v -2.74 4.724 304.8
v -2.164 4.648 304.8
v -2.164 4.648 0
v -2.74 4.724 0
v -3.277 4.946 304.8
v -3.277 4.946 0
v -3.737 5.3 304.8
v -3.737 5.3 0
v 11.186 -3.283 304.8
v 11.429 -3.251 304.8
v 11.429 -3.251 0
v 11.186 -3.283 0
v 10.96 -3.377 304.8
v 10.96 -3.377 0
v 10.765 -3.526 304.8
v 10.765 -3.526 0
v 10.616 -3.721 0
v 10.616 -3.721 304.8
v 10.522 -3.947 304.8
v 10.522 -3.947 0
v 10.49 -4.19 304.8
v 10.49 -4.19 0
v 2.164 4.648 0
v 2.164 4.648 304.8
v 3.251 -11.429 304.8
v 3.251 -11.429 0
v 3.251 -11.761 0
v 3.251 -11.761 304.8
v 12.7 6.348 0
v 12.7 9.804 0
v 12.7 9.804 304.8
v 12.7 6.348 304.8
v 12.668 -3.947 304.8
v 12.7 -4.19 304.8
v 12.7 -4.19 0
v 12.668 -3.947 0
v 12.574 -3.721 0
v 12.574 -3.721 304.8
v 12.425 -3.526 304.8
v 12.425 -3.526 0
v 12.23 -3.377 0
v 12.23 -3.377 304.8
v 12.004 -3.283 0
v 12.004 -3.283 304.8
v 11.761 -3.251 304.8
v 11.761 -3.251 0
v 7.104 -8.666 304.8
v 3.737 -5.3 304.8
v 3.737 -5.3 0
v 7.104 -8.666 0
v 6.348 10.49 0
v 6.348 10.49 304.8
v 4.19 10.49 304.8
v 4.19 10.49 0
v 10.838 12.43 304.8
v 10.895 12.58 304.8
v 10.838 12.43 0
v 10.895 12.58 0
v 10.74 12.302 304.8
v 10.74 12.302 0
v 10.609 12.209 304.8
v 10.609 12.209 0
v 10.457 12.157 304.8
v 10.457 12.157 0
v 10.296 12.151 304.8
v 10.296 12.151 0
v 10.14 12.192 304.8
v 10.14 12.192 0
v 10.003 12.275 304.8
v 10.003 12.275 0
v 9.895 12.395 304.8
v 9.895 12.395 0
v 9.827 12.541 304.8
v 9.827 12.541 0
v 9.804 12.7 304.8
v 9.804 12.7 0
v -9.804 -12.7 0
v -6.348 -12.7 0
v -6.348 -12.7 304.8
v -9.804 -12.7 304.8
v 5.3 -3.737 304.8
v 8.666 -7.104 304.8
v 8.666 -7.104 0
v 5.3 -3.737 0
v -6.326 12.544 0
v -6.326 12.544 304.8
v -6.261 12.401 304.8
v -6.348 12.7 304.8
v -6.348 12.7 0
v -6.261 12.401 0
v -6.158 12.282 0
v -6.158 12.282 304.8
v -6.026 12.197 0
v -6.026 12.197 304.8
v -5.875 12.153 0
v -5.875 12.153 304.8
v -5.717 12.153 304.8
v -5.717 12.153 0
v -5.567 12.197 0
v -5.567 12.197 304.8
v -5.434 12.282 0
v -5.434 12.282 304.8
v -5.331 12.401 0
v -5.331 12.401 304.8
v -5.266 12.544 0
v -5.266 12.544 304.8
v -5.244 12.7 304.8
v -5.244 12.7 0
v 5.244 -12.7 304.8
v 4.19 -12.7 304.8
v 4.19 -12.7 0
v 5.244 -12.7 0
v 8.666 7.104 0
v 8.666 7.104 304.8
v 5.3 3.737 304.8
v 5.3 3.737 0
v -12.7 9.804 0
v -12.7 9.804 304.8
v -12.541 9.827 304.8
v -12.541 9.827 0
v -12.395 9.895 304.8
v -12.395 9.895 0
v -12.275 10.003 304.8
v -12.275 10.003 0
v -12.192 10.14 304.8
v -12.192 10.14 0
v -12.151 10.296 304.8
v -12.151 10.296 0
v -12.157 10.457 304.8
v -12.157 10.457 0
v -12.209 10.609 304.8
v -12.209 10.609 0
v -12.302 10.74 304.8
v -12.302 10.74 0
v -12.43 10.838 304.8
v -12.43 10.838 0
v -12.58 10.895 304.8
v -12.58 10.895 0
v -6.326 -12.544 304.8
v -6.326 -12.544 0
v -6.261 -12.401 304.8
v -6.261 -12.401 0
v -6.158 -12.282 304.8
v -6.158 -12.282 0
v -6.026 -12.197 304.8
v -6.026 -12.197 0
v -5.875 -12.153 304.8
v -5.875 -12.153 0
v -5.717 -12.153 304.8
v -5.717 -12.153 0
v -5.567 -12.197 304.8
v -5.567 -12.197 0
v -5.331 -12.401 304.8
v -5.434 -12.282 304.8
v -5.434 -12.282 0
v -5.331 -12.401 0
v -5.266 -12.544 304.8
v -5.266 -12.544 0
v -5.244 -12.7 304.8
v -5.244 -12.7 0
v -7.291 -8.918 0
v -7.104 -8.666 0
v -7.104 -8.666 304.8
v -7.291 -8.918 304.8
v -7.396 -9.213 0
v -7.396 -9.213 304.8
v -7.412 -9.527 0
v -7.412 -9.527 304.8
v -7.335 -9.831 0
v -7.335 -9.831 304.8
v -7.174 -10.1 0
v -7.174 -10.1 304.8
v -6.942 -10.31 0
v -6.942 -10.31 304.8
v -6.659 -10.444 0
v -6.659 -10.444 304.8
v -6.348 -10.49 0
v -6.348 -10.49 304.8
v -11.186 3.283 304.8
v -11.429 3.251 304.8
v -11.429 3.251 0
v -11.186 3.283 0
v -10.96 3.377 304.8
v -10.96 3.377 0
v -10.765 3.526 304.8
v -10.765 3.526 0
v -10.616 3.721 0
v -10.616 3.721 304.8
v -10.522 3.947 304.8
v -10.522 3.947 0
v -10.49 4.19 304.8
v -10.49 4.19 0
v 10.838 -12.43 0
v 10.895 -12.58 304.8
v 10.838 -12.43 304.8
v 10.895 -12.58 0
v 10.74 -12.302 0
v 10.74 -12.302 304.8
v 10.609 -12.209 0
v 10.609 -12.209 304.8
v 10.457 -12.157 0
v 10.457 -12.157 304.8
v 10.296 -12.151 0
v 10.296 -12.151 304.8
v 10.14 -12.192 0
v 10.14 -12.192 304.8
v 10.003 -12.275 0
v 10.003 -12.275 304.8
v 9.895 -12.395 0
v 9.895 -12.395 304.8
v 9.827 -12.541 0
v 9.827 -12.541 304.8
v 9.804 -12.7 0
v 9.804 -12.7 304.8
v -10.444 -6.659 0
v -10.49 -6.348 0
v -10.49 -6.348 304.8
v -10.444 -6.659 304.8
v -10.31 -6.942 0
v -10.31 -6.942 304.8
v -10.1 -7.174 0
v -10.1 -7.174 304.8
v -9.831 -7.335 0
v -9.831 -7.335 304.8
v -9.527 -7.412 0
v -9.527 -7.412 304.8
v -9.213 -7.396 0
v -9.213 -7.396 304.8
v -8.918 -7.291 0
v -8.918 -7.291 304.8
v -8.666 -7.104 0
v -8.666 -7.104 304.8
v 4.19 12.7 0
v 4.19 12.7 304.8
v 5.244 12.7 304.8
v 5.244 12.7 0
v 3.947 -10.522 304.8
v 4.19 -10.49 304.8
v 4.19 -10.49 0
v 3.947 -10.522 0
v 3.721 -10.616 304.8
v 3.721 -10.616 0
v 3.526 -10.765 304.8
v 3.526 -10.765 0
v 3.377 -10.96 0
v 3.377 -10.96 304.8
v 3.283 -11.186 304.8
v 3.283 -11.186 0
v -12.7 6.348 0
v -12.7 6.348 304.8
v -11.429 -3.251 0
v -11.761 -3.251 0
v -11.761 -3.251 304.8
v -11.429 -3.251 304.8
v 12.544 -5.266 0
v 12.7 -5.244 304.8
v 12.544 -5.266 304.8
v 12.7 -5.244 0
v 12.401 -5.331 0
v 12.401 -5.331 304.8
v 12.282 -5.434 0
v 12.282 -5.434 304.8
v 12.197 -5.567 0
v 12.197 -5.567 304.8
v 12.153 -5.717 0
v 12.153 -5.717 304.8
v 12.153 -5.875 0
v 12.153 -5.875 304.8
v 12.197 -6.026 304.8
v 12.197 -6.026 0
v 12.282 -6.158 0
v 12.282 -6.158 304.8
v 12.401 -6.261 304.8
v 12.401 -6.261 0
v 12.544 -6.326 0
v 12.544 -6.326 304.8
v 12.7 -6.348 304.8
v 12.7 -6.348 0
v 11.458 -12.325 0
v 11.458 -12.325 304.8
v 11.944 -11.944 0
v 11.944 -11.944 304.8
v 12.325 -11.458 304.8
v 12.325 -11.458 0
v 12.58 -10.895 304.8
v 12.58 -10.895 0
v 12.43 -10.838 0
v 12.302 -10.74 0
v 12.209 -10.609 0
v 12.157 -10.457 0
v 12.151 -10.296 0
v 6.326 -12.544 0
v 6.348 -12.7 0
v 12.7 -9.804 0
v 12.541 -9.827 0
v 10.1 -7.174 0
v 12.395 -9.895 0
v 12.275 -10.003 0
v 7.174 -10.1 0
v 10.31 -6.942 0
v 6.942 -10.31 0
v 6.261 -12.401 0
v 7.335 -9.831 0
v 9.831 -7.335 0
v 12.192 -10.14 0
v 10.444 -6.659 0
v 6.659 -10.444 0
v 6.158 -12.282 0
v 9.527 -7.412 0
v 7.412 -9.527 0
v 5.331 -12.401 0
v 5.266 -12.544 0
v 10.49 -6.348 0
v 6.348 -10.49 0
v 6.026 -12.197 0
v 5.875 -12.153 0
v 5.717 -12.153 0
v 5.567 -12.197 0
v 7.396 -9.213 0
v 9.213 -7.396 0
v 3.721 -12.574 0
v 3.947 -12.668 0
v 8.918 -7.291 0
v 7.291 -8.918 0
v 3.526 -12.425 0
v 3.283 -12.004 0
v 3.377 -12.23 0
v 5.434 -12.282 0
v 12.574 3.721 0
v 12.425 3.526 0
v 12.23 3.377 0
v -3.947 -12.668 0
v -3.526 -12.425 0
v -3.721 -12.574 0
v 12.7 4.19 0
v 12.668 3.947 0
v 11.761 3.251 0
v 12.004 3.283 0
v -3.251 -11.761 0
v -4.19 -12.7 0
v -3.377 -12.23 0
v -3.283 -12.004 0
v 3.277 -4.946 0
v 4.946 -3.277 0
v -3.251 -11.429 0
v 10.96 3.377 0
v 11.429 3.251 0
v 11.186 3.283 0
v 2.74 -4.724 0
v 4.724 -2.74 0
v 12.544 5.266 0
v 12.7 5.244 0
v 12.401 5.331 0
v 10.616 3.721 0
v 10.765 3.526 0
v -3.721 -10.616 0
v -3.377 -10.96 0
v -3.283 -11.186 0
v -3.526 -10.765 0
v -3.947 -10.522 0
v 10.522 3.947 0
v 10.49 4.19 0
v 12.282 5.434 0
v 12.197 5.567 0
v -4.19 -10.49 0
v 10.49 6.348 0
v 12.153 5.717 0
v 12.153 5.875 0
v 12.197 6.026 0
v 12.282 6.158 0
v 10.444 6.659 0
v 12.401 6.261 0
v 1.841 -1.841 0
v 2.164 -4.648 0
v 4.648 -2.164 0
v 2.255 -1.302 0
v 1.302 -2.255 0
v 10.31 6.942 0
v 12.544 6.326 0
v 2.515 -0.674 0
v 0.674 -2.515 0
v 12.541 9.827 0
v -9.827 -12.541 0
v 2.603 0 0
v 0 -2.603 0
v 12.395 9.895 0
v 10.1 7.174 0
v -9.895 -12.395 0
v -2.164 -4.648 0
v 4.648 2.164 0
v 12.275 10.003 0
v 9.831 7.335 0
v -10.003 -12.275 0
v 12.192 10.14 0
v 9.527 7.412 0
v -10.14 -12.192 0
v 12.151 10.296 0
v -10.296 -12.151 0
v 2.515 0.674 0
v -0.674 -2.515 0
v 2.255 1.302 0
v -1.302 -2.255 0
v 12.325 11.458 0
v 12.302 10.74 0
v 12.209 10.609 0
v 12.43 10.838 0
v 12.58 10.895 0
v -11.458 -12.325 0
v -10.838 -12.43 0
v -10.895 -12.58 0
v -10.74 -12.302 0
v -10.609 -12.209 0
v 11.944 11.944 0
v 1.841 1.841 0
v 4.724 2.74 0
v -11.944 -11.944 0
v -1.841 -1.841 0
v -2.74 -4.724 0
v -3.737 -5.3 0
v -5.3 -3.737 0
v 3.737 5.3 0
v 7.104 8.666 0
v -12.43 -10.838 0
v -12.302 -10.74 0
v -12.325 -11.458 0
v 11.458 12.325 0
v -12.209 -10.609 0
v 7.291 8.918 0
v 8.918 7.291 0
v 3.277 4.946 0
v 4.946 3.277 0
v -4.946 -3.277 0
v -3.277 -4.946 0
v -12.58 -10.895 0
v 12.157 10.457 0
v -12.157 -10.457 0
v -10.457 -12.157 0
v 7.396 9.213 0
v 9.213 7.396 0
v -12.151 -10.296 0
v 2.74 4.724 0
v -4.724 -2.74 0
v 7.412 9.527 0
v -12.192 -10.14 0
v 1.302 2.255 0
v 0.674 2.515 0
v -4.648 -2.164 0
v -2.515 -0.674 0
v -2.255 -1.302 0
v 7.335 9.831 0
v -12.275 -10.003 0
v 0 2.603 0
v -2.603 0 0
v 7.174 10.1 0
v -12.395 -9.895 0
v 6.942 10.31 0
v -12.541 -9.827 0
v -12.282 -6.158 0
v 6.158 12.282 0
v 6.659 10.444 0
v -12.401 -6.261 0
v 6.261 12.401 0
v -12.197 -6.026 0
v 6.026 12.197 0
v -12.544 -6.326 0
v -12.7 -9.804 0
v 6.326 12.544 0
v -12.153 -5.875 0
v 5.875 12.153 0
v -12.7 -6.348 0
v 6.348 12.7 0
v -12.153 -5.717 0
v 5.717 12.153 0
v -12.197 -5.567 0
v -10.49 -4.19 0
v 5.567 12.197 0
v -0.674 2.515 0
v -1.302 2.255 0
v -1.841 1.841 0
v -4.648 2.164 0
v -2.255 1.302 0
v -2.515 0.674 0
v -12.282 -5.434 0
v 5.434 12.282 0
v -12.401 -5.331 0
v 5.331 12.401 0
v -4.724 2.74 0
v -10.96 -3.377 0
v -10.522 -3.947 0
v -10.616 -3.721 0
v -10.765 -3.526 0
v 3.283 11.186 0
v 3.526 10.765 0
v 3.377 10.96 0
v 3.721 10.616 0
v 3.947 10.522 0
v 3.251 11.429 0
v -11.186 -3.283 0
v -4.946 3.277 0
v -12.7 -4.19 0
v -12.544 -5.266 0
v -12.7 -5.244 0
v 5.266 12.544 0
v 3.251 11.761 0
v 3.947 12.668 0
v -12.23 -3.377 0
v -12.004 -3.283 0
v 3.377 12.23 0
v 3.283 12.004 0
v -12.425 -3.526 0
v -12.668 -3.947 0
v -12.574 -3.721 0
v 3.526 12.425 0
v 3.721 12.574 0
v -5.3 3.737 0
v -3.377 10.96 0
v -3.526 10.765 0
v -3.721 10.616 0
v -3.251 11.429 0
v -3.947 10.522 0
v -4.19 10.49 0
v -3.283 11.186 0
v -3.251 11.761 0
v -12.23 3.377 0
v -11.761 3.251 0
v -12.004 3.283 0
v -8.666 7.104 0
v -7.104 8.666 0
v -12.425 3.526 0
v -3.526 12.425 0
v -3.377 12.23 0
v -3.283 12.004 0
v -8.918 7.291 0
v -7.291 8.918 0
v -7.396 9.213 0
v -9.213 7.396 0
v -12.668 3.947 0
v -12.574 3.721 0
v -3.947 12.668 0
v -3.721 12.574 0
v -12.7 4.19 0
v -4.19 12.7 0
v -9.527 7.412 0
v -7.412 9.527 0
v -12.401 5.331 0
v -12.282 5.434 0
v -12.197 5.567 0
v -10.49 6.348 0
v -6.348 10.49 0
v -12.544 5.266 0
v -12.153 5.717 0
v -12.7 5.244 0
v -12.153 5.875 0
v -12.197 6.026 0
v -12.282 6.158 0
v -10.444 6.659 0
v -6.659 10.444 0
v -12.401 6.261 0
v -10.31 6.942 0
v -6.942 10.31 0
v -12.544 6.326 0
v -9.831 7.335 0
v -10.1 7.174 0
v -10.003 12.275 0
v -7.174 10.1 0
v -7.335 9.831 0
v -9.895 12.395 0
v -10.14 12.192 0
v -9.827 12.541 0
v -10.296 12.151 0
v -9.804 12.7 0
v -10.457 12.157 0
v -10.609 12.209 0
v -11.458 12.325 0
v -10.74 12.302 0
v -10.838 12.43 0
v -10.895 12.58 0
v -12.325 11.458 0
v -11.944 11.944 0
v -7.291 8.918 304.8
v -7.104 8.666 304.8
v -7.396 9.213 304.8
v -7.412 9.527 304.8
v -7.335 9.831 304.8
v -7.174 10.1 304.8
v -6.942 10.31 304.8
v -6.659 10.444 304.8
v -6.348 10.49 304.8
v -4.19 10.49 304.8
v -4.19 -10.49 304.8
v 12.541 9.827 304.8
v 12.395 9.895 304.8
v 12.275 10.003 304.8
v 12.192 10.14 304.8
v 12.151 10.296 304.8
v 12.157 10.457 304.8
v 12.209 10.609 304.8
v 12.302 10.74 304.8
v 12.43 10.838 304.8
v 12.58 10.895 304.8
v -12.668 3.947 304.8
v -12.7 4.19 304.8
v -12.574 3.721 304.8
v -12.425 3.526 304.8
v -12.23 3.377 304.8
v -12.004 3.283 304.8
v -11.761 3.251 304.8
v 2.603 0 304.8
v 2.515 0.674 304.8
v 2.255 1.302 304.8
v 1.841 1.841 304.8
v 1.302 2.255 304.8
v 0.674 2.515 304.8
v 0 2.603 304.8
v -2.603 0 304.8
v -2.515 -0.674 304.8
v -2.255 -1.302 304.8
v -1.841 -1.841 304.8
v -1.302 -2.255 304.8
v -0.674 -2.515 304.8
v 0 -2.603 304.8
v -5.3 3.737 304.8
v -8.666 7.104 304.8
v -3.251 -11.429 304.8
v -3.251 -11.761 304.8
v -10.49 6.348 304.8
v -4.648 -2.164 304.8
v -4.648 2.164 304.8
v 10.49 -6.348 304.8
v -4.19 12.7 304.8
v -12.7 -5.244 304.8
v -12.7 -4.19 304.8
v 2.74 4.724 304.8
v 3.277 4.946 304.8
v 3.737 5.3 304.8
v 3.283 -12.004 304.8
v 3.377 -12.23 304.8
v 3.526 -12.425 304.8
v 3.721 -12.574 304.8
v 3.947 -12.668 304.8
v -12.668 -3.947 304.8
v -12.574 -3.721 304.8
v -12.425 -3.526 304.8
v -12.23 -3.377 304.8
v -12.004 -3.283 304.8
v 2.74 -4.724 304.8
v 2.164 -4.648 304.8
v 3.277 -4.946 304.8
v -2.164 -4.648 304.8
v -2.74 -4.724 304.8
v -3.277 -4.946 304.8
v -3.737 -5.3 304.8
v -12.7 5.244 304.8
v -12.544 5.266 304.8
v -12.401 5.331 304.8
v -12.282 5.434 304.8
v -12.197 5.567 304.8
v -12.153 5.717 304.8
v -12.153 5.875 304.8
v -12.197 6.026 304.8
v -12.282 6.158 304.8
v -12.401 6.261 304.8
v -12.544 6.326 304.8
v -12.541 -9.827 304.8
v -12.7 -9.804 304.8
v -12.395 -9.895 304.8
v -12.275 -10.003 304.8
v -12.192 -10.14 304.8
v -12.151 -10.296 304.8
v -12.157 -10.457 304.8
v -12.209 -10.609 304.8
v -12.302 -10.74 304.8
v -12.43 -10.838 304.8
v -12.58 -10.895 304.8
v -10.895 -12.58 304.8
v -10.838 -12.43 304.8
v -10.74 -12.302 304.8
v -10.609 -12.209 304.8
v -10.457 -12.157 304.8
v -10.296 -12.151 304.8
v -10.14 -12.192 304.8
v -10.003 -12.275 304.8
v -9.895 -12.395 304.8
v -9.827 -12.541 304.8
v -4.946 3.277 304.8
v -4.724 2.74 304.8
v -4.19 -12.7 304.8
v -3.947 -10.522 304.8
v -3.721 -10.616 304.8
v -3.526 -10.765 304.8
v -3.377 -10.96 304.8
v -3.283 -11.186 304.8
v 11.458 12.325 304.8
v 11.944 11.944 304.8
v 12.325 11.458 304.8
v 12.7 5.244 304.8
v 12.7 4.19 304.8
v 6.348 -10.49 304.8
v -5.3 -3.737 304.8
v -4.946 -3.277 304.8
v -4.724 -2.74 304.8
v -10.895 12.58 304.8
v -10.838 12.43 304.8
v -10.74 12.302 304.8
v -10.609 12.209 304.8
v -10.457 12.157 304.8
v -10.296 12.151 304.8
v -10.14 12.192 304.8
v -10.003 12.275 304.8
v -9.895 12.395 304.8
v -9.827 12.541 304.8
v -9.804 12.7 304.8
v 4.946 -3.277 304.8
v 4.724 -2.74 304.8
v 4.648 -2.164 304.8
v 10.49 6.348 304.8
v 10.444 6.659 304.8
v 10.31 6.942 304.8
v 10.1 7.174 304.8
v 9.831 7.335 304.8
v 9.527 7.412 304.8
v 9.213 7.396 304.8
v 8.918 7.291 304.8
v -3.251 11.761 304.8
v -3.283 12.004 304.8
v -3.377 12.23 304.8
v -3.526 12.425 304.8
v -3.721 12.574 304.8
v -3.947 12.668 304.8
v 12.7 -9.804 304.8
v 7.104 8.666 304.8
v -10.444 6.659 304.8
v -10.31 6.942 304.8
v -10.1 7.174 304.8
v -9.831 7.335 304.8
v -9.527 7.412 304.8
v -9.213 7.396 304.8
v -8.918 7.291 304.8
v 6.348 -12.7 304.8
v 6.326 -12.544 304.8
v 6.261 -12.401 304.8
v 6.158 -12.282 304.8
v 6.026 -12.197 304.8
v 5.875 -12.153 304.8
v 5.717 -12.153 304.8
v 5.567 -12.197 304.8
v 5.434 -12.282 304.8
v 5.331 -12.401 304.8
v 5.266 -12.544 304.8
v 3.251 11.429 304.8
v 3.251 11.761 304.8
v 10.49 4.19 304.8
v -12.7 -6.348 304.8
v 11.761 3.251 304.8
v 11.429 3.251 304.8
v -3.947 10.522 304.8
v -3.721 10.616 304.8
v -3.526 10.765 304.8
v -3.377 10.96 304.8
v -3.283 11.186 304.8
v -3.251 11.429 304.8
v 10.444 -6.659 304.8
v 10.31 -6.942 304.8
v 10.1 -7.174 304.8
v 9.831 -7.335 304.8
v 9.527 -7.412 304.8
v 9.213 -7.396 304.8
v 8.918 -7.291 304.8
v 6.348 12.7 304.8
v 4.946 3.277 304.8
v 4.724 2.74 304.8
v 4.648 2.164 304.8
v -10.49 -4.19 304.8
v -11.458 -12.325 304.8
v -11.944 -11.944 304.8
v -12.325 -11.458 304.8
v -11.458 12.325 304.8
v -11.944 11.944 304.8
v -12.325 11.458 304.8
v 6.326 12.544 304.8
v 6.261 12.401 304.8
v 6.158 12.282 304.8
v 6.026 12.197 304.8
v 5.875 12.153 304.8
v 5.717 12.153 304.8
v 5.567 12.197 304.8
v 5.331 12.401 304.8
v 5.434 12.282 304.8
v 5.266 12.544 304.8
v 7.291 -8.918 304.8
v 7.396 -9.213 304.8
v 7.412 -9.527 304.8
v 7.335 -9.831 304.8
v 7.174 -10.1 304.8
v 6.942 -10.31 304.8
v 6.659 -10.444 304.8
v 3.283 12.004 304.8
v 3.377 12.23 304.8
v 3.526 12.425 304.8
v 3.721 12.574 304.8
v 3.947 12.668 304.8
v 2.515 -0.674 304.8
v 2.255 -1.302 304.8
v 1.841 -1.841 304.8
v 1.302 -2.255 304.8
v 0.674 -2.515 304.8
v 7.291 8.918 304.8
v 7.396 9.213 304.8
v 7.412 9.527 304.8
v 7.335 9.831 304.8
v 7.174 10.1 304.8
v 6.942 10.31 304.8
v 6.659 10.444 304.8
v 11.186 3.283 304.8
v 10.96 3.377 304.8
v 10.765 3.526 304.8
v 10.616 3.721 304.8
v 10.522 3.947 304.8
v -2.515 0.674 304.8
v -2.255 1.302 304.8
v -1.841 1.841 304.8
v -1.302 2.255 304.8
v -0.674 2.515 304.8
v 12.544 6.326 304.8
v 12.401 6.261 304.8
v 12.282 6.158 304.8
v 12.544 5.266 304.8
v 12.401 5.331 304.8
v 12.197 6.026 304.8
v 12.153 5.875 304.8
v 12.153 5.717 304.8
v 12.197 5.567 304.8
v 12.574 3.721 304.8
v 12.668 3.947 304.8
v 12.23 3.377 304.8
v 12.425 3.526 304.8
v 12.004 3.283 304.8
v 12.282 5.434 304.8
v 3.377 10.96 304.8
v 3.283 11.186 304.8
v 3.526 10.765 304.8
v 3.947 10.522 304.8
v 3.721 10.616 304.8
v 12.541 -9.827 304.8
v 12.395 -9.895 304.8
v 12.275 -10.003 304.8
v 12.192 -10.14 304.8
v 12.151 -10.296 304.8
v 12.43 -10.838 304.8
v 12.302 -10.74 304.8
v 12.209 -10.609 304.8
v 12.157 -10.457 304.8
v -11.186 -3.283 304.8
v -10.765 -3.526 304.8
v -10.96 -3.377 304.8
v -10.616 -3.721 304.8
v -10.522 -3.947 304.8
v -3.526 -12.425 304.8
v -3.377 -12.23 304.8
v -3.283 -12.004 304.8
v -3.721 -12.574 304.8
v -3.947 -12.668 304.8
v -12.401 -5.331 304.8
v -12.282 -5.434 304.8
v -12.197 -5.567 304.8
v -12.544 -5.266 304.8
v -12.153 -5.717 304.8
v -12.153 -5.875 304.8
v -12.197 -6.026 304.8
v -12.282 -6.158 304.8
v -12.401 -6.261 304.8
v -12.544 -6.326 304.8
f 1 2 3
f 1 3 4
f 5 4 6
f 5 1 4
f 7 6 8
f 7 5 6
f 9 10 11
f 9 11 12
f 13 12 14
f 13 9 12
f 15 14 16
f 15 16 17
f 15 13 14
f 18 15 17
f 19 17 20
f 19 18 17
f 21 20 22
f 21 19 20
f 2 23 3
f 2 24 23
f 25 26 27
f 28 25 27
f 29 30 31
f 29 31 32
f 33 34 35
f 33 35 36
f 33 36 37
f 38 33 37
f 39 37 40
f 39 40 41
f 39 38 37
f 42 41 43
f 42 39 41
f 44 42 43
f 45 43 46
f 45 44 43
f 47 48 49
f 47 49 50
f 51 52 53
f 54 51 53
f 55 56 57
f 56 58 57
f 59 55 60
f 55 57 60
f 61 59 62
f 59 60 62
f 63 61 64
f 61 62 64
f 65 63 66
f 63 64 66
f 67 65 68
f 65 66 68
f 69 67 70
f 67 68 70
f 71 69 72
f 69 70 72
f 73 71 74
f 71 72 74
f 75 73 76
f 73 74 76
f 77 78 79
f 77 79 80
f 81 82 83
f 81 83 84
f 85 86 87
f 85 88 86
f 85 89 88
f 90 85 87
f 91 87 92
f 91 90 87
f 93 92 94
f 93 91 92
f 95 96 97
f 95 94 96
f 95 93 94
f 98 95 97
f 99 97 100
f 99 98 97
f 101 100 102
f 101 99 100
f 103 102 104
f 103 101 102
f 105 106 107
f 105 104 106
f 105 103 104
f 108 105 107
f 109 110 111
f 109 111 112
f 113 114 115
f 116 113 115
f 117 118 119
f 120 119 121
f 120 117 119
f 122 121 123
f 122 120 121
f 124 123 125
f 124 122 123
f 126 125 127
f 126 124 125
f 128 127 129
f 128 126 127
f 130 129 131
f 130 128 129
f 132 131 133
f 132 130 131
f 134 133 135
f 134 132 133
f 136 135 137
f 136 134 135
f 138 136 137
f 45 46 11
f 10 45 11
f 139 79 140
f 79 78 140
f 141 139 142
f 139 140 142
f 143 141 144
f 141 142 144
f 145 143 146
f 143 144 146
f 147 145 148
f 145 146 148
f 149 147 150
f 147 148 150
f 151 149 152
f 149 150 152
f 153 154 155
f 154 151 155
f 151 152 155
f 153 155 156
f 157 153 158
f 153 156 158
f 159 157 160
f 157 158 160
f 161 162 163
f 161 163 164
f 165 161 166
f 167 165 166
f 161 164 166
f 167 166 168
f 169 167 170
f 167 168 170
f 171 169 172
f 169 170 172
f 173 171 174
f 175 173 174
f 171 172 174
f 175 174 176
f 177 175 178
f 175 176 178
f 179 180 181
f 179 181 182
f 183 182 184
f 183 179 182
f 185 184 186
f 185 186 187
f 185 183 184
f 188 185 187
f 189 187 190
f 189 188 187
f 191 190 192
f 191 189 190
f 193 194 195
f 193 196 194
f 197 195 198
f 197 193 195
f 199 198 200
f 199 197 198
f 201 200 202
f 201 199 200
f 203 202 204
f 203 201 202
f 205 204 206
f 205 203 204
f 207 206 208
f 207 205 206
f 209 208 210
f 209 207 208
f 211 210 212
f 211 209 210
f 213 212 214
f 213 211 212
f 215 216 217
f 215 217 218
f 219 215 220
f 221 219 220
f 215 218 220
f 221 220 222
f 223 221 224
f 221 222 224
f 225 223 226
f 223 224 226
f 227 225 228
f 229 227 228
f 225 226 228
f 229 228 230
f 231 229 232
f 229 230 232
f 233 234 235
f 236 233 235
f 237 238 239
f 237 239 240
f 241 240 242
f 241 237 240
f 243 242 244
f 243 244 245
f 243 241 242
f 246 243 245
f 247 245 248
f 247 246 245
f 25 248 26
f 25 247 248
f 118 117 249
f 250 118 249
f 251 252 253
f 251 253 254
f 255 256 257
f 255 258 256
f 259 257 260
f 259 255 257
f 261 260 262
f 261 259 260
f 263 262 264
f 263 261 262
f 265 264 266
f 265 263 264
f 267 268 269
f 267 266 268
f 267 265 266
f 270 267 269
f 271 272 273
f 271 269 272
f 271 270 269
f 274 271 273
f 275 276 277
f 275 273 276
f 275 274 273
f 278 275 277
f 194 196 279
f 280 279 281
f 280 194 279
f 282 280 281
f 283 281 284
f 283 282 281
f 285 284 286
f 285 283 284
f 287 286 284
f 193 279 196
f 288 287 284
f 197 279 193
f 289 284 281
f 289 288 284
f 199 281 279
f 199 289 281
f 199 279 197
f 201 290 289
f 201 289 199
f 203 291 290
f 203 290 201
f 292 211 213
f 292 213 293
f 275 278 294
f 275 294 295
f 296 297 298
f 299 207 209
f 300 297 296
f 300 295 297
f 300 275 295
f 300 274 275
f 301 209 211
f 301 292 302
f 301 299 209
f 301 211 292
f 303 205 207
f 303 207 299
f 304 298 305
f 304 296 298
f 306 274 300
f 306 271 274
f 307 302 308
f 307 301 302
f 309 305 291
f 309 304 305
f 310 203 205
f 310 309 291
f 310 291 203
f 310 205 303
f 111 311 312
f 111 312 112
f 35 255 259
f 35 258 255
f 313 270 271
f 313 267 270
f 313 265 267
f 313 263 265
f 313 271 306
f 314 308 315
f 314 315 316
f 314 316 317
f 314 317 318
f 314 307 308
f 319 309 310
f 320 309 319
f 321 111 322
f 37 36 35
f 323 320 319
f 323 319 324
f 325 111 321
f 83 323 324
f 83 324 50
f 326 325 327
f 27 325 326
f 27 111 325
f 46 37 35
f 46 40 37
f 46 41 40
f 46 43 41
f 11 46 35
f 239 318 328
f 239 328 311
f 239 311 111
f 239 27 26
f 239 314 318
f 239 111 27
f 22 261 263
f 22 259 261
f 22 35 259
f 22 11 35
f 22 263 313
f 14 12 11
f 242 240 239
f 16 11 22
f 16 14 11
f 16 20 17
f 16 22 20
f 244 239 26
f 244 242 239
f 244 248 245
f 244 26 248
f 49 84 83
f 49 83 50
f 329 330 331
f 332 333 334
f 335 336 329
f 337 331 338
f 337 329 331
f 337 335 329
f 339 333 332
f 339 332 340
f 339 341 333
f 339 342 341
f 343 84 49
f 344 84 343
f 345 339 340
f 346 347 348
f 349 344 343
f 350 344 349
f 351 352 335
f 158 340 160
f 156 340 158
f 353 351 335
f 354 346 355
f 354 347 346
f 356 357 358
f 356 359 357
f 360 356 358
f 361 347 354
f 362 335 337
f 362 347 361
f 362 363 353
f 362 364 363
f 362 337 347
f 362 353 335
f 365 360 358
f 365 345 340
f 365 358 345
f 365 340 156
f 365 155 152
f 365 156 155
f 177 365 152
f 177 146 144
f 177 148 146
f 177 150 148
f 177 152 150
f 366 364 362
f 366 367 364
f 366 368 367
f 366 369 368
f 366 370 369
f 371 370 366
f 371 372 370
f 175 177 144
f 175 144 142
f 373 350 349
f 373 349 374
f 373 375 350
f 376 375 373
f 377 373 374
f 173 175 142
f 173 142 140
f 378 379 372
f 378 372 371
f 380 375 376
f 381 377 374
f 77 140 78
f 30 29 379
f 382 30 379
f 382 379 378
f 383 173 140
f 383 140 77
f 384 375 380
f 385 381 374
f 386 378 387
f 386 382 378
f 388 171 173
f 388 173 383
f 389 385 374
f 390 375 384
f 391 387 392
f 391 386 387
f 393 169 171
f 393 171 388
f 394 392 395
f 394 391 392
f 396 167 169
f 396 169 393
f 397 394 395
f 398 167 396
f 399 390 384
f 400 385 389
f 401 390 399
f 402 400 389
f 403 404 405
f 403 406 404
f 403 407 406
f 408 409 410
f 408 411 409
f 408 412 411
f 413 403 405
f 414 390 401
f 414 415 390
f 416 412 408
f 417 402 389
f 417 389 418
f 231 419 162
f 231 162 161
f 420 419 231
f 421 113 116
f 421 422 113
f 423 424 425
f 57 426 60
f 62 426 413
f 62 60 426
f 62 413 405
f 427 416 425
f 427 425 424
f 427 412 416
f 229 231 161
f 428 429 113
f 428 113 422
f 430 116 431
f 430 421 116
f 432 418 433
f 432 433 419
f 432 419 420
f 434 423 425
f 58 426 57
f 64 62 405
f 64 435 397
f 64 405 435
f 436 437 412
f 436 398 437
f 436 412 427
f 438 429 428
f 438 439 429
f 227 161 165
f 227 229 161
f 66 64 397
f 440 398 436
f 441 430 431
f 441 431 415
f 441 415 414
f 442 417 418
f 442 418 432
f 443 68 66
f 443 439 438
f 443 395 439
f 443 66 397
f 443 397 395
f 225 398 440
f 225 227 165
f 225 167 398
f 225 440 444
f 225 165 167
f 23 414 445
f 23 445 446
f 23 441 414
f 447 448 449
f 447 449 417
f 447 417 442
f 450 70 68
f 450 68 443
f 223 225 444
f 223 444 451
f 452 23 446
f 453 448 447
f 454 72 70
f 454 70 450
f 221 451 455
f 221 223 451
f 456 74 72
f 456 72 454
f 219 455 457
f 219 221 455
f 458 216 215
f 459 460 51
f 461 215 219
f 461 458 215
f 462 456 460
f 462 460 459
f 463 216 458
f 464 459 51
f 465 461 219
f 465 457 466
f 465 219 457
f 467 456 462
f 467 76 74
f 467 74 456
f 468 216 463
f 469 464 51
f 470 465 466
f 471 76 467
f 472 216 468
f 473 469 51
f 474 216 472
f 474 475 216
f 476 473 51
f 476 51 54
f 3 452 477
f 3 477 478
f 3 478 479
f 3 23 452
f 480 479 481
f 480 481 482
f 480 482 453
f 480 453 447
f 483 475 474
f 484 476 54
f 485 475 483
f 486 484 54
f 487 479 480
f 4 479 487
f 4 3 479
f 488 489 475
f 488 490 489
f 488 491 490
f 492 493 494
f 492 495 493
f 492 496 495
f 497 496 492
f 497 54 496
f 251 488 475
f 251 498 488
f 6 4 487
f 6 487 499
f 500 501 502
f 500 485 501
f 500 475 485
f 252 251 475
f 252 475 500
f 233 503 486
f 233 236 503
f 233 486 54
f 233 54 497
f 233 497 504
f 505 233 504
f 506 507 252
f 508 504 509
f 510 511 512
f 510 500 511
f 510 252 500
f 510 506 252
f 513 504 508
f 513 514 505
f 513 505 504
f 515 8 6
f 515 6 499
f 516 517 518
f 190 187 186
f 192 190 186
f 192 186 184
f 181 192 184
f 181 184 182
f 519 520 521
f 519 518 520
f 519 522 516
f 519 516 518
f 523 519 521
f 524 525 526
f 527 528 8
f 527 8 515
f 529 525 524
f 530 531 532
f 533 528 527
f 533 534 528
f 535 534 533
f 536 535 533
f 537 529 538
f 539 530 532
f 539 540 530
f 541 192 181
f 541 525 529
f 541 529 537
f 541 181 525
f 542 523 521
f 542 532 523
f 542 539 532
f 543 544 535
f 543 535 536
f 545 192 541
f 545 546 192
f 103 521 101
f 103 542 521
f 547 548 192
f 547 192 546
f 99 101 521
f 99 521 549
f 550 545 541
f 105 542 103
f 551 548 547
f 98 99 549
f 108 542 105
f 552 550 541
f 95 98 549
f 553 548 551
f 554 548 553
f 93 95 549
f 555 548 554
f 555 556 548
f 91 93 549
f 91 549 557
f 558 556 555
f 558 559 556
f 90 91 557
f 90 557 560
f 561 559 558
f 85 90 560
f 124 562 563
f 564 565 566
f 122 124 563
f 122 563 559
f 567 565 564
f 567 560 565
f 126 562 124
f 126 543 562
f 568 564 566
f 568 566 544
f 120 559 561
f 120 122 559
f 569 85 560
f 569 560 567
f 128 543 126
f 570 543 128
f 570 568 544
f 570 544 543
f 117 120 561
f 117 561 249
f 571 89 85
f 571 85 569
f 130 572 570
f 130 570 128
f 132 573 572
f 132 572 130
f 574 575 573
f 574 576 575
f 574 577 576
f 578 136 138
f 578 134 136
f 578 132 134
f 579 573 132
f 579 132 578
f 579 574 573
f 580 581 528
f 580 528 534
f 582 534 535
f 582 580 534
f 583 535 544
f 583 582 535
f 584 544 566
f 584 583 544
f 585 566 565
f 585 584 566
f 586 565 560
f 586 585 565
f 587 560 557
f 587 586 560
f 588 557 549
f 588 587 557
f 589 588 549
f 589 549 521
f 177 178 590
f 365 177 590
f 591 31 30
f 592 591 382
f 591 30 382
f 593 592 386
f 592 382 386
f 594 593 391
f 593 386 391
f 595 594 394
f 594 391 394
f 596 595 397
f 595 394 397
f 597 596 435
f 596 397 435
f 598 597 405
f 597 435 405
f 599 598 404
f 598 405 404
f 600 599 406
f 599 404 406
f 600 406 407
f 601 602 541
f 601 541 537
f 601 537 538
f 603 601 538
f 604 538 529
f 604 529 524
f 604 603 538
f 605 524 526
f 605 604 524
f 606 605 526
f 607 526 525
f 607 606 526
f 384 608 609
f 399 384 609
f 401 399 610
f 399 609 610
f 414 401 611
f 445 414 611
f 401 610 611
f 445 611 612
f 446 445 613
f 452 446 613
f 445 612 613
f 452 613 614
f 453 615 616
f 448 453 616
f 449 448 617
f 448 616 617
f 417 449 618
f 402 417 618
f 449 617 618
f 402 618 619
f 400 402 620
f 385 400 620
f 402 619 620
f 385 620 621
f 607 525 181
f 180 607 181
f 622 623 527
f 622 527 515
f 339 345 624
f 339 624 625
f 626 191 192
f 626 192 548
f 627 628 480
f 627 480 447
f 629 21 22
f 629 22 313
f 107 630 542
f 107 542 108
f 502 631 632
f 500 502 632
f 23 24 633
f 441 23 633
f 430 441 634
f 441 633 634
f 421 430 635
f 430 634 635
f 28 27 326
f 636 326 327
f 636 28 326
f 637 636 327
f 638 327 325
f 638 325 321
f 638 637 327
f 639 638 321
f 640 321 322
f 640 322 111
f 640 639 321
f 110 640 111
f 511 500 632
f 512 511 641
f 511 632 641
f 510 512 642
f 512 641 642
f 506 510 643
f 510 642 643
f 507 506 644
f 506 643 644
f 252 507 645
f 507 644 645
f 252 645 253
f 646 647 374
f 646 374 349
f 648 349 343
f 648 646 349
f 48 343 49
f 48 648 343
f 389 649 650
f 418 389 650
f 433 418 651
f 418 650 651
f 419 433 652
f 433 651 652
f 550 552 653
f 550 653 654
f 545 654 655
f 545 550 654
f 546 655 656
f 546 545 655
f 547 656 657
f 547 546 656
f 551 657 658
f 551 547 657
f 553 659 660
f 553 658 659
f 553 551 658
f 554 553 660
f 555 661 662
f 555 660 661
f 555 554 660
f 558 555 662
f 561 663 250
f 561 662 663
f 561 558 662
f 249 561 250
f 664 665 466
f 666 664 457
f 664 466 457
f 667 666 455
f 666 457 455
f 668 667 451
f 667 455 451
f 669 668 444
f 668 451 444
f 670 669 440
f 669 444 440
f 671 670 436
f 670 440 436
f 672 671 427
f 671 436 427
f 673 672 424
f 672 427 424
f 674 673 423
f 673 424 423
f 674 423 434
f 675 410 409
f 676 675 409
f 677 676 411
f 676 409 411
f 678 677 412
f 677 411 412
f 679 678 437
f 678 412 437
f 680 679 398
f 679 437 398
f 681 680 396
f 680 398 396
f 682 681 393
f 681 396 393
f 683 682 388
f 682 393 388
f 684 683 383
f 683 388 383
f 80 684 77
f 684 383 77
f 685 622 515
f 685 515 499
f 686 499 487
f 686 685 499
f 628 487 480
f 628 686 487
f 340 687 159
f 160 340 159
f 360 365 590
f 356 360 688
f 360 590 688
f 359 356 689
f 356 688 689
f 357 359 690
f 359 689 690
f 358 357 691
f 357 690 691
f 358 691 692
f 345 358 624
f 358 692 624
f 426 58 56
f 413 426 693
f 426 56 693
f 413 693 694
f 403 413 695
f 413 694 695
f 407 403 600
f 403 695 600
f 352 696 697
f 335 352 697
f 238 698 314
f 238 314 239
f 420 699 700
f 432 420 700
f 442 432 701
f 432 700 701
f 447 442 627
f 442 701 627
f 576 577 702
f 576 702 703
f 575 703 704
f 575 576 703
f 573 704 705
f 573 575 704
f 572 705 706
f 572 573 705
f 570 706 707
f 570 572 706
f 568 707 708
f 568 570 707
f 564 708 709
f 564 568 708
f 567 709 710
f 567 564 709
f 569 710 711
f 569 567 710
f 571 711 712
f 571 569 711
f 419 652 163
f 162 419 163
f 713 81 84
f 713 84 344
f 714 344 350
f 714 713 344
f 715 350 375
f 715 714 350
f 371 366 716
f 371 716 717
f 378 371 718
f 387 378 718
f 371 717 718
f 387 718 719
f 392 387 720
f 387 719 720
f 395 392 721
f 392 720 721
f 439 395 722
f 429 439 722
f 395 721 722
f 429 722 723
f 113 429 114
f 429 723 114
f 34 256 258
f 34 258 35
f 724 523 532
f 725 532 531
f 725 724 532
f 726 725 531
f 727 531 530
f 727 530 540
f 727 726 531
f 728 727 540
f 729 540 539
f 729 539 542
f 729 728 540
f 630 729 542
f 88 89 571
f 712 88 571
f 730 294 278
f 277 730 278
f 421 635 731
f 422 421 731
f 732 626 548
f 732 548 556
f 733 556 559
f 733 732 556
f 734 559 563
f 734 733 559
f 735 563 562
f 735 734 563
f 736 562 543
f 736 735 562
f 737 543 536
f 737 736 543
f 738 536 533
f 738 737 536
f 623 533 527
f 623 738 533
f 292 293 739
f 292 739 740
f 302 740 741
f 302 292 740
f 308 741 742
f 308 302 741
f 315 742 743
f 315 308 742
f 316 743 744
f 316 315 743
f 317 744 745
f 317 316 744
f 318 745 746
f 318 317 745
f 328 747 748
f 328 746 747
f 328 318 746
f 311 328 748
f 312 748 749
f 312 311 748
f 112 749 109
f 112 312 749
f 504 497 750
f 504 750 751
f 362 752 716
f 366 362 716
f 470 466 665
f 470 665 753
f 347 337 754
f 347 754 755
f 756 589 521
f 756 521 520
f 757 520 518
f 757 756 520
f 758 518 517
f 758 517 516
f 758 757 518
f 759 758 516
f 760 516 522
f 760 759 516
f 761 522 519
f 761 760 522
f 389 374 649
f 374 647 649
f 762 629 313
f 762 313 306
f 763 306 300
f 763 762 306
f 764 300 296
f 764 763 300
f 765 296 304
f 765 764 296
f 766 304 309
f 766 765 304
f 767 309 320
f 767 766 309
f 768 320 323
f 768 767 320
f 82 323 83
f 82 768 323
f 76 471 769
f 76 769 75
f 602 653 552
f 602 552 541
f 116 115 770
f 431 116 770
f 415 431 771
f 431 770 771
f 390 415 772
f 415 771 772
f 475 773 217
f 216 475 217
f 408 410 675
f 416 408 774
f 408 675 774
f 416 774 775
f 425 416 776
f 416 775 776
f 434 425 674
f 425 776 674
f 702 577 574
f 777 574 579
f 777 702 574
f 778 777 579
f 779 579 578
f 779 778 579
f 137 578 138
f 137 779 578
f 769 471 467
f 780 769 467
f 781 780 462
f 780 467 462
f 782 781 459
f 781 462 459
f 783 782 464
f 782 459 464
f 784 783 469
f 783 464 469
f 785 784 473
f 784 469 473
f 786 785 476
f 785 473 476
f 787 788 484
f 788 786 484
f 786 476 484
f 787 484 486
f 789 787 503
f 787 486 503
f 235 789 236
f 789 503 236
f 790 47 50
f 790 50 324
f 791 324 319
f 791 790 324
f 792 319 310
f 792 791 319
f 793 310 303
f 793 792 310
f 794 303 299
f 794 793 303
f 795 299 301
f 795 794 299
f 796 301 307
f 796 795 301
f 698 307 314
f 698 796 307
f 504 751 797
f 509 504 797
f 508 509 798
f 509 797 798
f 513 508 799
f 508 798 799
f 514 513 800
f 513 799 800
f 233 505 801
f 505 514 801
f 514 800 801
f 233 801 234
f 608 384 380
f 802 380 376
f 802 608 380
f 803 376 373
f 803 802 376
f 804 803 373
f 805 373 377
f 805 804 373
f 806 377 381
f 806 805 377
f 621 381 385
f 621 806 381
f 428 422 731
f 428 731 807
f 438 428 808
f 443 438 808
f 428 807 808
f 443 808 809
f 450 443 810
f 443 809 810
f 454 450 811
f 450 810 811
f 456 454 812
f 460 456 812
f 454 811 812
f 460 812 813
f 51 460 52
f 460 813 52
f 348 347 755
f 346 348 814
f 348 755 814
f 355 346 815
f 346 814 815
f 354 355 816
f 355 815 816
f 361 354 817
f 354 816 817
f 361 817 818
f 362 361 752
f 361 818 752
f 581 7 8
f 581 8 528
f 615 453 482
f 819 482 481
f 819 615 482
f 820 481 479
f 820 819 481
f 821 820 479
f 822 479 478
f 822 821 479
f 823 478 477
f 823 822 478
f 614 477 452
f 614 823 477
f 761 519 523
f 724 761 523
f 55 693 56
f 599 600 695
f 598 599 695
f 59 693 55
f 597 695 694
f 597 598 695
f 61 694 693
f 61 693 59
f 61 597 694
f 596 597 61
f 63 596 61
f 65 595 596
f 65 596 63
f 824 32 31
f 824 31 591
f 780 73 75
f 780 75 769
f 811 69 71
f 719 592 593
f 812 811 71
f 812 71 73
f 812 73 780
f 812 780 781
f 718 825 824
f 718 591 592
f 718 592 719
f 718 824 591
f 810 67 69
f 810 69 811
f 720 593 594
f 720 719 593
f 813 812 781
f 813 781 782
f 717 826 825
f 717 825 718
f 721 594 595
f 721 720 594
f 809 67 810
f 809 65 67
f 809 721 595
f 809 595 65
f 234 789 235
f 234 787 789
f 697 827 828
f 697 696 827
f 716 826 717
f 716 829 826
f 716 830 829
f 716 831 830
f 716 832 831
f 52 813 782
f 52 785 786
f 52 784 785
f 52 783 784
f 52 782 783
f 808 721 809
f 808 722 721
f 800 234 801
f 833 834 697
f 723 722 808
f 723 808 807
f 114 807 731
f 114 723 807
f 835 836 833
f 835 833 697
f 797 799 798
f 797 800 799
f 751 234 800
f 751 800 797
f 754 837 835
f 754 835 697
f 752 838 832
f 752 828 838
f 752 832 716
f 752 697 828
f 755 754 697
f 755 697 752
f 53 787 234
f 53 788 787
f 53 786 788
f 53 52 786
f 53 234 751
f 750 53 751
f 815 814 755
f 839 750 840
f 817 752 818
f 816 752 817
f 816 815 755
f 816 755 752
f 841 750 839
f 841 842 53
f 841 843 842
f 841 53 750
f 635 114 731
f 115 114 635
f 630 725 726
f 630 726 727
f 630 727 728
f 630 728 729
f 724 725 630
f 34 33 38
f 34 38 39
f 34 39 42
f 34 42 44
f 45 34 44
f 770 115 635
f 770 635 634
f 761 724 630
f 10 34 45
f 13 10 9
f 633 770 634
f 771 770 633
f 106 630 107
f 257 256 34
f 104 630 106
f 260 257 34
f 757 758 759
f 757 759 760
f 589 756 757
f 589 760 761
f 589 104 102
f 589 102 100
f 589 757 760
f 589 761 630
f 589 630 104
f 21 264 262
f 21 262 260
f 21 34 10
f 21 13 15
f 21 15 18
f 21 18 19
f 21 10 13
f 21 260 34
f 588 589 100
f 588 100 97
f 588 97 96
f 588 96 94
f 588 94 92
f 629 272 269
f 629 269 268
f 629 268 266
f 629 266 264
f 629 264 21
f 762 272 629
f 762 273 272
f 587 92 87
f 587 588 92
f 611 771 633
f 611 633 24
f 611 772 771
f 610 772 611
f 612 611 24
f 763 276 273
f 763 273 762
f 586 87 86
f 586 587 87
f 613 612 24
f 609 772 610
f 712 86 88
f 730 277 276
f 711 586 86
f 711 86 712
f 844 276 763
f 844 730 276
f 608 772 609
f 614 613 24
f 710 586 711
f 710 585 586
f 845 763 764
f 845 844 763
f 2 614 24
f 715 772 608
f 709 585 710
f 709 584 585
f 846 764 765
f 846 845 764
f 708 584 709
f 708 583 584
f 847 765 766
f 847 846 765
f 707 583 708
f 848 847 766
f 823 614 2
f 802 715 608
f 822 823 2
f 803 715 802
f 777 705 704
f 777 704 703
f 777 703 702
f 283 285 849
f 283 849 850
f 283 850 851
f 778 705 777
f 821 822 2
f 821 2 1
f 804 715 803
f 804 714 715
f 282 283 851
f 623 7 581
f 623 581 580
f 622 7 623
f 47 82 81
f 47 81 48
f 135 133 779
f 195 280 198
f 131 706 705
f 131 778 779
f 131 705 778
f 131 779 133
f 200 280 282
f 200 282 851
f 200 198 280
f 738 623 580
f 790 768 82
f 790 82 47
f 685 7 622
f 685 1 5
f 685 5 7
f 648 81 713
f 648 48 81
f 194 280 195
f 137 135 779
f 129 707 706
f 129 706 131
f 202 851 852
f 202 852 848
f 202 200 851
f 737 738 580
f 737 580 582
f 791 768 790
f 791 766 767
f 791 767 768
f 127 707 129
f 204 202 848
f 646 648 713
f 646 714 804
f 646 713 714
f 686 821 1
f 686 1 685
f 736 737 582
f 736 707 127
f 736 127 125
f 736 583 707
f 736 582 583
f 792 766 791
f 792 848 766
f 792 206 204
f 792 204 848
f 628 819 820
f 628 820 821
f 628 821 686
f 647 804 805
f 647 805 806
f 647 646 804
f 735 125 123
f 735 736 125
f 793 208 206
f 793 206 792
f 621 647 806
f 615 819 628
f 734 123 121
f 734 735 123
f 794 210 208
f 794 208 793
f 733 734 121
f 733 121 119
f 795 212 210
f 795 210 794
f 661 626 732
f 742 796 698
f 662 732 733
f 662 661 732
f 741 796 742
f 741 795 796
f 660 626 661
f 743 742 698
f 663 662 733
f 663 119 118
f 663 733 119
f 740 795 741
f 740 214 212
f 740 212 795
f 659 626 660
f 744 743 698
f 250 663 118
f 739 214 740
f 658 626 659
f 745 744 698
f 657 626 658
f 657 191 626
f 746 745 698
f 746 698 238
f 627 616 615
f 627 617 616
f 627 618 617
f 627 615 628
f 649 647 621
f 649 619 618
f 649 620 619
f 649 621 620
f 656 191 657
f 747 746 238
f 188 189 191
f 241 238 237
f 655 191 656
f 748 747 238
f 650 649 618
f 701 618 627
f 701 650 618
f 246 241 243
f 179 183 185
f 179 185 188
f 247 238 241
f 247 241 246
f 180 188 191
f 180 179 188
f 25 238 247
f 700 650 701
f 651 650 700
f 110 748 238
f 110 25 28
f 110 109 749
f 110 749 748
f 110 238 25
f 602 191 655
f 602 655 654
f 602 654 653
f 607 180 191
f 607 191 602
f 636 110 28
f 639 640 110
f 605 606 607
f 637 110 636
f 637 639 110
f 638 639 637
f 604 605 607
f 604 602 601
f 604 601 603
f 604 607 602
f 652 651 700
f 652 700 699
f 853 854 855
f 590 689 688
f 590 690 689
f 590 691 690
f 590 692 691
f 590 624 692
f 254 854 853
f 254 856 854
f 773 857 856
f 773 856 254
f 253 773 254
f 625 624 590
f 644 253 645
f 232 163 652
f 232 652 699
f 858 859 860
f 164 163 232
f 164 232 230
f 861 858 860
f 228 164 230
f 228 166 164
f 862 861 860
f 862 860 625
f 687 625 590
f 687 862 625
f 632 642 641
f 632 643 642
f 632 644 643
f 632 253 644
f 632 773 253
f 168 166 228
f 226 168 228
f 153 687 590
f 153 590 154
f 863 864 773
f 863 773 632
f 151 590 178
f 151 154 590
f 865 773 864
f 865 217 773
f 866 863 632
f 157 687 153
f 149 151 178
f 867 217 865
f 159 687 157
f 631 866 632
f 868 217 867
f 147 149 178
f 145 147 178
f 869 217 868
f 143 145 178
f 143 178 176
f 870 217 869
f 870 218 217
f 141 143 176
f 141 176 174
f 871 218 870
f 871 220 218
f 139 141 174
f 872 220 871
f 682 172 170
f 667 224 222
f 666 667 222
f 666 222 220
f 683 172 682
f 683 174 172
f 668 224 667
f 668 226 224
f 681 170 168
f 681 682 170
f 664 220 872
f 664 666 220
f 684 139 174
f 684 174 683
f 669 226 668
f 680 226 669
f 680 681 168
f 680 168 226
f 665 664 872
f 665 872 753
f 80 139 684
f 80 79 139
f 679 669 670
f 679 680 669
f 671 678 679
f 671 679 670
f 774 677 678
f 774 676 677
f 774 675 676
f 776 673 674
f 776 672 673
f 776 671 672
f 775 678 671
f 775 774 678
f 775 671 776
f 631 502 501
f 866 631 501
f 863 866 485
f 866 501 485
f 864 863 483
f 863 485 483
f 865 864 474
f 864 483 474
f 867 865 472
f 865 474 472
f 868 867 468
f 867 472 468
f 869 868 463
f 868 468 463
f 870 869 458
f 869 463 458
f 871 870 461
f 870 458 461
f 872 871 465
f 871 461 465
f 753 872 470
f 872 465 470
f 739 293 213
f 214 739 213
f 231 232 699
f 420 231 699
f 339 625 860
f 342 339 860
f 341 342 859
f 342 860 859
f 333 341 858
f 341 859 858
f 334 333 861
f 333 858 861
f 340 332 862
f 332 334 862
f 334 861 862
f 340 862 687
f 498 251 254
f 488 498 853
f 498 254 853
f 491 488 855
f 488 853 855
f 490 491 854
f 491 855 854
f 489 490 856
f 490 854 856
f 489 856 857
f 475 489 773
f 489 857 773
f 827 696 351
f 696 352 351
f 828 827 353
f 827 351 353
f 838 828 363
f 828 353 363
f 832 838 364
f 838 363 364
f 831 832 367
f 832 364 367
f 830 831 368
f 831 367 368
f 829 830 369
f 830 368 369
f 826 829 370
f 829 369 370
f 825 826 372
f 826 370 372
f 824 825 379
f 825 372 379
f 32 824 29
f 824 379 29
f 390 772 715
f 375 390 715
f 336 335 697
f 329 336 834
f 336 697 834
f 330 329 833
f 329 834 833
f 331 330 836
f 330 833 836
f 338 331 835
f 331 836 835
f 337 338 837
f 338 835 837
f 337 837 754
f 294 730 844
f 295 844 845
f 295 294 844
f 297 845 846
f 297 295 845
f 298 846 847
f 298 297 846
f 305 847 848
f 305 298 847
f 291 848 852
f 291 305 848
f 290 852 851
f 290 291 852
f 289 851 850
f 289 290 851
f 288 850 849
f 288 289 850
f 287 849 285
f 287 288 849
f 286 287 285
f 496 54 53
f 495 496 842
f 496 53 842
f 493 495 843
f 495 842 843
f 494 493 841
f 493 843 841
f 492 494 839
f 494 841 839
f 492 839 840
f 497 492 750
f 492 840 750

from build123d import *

# Parameters (mm, degrees)
BOSS_EXTRUDE1_DEPTH     = 304.8
SKETCH5_R               = 0.55245
CUT_EXTRUDE1_DEPTH      = 305.8
CUT_EXTRUDE1_DEPTH_BACK = 305.8
SKETCH6_W               = 73.397173187
SKETCH6_H               = 48.877854652
CUT_EXTRUDE2_DEPTH      = 304.8


with BuildPart() as part:
    # Sketch4 → Boss-Extrude1 (new body, symmetric)
    with BuildSketch(Plane.XY):
        with BuildLine():
            Line((4.190365, -12.7), (10.11729625, -12.7))
            ThreePointArc((10.11729625, -12.7), (11.943543585, -11.943543585), (12.7, -10.11729625))
            Line((12.7, -10.11729625), (12.7, -4.190365))
            ThreePointArc((12.7, -4.190365), (12.42492494, -3.52627506), (11.760835, -3.2512))
            Line((11.760835, -3.2512), (11.429365, -3.2512))
            ThreePointArc((11.429365, -3.2512), (10.76527506, -3.52627506), (10.4902, -4.190365))
            Line((10.4902, -4.190365), (10.4902, -6.348478019))
            ThreePointArc((10.4902, -6.348478019), (9.830707141, -7.335478831), (8.666460301, -7.103895736))
            Line((8.666460301, -7.103895736), (5.299899128, -3.737334563))
            ThreePointArc((5.299899128, -3.737334563), (4.817571085, -3.015479634), (4.6482, -2.16399369))
            Line((4.6482, -2.16399369), (4.6482, 0))
            Line((4.6482, 0), (2.6035, 0))
            ThreePointArc((2.6035, 0), (1.840952505, -1.840952505), (0, -2.6035))
            Line((0, -2.6035), (0, -4.6482))
            Line((0, -4.6482), (2.16399369, -4.6482))
            ThreePointArc((2.16399369, -4.6482), (3.015479634, -4.817571085), (3.737334563, -5.299899128))
            Line((3.737334563, -5.299899128), (7.103895736, -8.666460301))
            ThreePointArc((7.103895736, -8.666460301), (7.335478831, -9.830707141), (6.348478019, -10.4902))
            Line((6.348478019, -10.4902), (4.190365, -10.4902))
            ThreePointArc((4.190365, -10.4902), (3.52627506, -10.76527506), (3.2512, -11.429365))
            Line((3.2512, -11.429365), (3.2512, -11.760835))
            ThreePointArc((3.2512, -11.760835), (3.52627506, -12.42492494), (4.190365, -12.7))
        make_face()
    extrude(amount=BOSS_EXTRUDE1_DEPTH, both=True)

    # Sketch5 → Cut-Extrude1 (cut, two sides)
    with BuildSketch(Plane.XY) as cut_extrude1_sk:
        with Locations((10.356153152, -12.7)):
            Circle(SKETCH5_R)
        with Locations((5.796028019, -12.7)):
            Circle(SKETCH5_R)
        with Locations((12.7, -10.356153152)):
            Circle(SKETCH5_R)
        with Locations((12.7, -5.796028019)):
            Circle(SKETCH5_R)
    extrude(amount=CUT_EXTRUDE1_DEPTH, mode=Mode.SUBTRACT)
    extrude(cut_extrude1_sk.sketch, amount=-CUT_EXTRUDE1_DEPTH_BACK, mode=Mode.SUBTRACT)

    # Mirror1: part across plane


with BuildPart() as part_1:
    add(part.part)
    add(part.part.mirror(Plane(origin=(0, 0, 0), x_dir=(0, 0, 1), z_dir=(1, 0, 0))))

    # Mirror2: part across plane


with BuildPart() as part_2:
    add(part_1.part)
    add(part_1.part.mirror(Plane.ZX))

    # Sketch6 → Cut-Extrude2 (cut)
    with BuildSketch(Plane(origin=(0, 0, -304.8), x_dir=(-1, 0, 0), z_dir=(0, 0, -1))):
        with Locations((-1.205868125, 1.286259333)):
            Rectangle(SKETCH6_W, SKETCH6_H)
    extrude(amount=-CUT_EXTRUDE2_DEPTH, mode=Mode.SUBTRACT)


solid = part_2.part
